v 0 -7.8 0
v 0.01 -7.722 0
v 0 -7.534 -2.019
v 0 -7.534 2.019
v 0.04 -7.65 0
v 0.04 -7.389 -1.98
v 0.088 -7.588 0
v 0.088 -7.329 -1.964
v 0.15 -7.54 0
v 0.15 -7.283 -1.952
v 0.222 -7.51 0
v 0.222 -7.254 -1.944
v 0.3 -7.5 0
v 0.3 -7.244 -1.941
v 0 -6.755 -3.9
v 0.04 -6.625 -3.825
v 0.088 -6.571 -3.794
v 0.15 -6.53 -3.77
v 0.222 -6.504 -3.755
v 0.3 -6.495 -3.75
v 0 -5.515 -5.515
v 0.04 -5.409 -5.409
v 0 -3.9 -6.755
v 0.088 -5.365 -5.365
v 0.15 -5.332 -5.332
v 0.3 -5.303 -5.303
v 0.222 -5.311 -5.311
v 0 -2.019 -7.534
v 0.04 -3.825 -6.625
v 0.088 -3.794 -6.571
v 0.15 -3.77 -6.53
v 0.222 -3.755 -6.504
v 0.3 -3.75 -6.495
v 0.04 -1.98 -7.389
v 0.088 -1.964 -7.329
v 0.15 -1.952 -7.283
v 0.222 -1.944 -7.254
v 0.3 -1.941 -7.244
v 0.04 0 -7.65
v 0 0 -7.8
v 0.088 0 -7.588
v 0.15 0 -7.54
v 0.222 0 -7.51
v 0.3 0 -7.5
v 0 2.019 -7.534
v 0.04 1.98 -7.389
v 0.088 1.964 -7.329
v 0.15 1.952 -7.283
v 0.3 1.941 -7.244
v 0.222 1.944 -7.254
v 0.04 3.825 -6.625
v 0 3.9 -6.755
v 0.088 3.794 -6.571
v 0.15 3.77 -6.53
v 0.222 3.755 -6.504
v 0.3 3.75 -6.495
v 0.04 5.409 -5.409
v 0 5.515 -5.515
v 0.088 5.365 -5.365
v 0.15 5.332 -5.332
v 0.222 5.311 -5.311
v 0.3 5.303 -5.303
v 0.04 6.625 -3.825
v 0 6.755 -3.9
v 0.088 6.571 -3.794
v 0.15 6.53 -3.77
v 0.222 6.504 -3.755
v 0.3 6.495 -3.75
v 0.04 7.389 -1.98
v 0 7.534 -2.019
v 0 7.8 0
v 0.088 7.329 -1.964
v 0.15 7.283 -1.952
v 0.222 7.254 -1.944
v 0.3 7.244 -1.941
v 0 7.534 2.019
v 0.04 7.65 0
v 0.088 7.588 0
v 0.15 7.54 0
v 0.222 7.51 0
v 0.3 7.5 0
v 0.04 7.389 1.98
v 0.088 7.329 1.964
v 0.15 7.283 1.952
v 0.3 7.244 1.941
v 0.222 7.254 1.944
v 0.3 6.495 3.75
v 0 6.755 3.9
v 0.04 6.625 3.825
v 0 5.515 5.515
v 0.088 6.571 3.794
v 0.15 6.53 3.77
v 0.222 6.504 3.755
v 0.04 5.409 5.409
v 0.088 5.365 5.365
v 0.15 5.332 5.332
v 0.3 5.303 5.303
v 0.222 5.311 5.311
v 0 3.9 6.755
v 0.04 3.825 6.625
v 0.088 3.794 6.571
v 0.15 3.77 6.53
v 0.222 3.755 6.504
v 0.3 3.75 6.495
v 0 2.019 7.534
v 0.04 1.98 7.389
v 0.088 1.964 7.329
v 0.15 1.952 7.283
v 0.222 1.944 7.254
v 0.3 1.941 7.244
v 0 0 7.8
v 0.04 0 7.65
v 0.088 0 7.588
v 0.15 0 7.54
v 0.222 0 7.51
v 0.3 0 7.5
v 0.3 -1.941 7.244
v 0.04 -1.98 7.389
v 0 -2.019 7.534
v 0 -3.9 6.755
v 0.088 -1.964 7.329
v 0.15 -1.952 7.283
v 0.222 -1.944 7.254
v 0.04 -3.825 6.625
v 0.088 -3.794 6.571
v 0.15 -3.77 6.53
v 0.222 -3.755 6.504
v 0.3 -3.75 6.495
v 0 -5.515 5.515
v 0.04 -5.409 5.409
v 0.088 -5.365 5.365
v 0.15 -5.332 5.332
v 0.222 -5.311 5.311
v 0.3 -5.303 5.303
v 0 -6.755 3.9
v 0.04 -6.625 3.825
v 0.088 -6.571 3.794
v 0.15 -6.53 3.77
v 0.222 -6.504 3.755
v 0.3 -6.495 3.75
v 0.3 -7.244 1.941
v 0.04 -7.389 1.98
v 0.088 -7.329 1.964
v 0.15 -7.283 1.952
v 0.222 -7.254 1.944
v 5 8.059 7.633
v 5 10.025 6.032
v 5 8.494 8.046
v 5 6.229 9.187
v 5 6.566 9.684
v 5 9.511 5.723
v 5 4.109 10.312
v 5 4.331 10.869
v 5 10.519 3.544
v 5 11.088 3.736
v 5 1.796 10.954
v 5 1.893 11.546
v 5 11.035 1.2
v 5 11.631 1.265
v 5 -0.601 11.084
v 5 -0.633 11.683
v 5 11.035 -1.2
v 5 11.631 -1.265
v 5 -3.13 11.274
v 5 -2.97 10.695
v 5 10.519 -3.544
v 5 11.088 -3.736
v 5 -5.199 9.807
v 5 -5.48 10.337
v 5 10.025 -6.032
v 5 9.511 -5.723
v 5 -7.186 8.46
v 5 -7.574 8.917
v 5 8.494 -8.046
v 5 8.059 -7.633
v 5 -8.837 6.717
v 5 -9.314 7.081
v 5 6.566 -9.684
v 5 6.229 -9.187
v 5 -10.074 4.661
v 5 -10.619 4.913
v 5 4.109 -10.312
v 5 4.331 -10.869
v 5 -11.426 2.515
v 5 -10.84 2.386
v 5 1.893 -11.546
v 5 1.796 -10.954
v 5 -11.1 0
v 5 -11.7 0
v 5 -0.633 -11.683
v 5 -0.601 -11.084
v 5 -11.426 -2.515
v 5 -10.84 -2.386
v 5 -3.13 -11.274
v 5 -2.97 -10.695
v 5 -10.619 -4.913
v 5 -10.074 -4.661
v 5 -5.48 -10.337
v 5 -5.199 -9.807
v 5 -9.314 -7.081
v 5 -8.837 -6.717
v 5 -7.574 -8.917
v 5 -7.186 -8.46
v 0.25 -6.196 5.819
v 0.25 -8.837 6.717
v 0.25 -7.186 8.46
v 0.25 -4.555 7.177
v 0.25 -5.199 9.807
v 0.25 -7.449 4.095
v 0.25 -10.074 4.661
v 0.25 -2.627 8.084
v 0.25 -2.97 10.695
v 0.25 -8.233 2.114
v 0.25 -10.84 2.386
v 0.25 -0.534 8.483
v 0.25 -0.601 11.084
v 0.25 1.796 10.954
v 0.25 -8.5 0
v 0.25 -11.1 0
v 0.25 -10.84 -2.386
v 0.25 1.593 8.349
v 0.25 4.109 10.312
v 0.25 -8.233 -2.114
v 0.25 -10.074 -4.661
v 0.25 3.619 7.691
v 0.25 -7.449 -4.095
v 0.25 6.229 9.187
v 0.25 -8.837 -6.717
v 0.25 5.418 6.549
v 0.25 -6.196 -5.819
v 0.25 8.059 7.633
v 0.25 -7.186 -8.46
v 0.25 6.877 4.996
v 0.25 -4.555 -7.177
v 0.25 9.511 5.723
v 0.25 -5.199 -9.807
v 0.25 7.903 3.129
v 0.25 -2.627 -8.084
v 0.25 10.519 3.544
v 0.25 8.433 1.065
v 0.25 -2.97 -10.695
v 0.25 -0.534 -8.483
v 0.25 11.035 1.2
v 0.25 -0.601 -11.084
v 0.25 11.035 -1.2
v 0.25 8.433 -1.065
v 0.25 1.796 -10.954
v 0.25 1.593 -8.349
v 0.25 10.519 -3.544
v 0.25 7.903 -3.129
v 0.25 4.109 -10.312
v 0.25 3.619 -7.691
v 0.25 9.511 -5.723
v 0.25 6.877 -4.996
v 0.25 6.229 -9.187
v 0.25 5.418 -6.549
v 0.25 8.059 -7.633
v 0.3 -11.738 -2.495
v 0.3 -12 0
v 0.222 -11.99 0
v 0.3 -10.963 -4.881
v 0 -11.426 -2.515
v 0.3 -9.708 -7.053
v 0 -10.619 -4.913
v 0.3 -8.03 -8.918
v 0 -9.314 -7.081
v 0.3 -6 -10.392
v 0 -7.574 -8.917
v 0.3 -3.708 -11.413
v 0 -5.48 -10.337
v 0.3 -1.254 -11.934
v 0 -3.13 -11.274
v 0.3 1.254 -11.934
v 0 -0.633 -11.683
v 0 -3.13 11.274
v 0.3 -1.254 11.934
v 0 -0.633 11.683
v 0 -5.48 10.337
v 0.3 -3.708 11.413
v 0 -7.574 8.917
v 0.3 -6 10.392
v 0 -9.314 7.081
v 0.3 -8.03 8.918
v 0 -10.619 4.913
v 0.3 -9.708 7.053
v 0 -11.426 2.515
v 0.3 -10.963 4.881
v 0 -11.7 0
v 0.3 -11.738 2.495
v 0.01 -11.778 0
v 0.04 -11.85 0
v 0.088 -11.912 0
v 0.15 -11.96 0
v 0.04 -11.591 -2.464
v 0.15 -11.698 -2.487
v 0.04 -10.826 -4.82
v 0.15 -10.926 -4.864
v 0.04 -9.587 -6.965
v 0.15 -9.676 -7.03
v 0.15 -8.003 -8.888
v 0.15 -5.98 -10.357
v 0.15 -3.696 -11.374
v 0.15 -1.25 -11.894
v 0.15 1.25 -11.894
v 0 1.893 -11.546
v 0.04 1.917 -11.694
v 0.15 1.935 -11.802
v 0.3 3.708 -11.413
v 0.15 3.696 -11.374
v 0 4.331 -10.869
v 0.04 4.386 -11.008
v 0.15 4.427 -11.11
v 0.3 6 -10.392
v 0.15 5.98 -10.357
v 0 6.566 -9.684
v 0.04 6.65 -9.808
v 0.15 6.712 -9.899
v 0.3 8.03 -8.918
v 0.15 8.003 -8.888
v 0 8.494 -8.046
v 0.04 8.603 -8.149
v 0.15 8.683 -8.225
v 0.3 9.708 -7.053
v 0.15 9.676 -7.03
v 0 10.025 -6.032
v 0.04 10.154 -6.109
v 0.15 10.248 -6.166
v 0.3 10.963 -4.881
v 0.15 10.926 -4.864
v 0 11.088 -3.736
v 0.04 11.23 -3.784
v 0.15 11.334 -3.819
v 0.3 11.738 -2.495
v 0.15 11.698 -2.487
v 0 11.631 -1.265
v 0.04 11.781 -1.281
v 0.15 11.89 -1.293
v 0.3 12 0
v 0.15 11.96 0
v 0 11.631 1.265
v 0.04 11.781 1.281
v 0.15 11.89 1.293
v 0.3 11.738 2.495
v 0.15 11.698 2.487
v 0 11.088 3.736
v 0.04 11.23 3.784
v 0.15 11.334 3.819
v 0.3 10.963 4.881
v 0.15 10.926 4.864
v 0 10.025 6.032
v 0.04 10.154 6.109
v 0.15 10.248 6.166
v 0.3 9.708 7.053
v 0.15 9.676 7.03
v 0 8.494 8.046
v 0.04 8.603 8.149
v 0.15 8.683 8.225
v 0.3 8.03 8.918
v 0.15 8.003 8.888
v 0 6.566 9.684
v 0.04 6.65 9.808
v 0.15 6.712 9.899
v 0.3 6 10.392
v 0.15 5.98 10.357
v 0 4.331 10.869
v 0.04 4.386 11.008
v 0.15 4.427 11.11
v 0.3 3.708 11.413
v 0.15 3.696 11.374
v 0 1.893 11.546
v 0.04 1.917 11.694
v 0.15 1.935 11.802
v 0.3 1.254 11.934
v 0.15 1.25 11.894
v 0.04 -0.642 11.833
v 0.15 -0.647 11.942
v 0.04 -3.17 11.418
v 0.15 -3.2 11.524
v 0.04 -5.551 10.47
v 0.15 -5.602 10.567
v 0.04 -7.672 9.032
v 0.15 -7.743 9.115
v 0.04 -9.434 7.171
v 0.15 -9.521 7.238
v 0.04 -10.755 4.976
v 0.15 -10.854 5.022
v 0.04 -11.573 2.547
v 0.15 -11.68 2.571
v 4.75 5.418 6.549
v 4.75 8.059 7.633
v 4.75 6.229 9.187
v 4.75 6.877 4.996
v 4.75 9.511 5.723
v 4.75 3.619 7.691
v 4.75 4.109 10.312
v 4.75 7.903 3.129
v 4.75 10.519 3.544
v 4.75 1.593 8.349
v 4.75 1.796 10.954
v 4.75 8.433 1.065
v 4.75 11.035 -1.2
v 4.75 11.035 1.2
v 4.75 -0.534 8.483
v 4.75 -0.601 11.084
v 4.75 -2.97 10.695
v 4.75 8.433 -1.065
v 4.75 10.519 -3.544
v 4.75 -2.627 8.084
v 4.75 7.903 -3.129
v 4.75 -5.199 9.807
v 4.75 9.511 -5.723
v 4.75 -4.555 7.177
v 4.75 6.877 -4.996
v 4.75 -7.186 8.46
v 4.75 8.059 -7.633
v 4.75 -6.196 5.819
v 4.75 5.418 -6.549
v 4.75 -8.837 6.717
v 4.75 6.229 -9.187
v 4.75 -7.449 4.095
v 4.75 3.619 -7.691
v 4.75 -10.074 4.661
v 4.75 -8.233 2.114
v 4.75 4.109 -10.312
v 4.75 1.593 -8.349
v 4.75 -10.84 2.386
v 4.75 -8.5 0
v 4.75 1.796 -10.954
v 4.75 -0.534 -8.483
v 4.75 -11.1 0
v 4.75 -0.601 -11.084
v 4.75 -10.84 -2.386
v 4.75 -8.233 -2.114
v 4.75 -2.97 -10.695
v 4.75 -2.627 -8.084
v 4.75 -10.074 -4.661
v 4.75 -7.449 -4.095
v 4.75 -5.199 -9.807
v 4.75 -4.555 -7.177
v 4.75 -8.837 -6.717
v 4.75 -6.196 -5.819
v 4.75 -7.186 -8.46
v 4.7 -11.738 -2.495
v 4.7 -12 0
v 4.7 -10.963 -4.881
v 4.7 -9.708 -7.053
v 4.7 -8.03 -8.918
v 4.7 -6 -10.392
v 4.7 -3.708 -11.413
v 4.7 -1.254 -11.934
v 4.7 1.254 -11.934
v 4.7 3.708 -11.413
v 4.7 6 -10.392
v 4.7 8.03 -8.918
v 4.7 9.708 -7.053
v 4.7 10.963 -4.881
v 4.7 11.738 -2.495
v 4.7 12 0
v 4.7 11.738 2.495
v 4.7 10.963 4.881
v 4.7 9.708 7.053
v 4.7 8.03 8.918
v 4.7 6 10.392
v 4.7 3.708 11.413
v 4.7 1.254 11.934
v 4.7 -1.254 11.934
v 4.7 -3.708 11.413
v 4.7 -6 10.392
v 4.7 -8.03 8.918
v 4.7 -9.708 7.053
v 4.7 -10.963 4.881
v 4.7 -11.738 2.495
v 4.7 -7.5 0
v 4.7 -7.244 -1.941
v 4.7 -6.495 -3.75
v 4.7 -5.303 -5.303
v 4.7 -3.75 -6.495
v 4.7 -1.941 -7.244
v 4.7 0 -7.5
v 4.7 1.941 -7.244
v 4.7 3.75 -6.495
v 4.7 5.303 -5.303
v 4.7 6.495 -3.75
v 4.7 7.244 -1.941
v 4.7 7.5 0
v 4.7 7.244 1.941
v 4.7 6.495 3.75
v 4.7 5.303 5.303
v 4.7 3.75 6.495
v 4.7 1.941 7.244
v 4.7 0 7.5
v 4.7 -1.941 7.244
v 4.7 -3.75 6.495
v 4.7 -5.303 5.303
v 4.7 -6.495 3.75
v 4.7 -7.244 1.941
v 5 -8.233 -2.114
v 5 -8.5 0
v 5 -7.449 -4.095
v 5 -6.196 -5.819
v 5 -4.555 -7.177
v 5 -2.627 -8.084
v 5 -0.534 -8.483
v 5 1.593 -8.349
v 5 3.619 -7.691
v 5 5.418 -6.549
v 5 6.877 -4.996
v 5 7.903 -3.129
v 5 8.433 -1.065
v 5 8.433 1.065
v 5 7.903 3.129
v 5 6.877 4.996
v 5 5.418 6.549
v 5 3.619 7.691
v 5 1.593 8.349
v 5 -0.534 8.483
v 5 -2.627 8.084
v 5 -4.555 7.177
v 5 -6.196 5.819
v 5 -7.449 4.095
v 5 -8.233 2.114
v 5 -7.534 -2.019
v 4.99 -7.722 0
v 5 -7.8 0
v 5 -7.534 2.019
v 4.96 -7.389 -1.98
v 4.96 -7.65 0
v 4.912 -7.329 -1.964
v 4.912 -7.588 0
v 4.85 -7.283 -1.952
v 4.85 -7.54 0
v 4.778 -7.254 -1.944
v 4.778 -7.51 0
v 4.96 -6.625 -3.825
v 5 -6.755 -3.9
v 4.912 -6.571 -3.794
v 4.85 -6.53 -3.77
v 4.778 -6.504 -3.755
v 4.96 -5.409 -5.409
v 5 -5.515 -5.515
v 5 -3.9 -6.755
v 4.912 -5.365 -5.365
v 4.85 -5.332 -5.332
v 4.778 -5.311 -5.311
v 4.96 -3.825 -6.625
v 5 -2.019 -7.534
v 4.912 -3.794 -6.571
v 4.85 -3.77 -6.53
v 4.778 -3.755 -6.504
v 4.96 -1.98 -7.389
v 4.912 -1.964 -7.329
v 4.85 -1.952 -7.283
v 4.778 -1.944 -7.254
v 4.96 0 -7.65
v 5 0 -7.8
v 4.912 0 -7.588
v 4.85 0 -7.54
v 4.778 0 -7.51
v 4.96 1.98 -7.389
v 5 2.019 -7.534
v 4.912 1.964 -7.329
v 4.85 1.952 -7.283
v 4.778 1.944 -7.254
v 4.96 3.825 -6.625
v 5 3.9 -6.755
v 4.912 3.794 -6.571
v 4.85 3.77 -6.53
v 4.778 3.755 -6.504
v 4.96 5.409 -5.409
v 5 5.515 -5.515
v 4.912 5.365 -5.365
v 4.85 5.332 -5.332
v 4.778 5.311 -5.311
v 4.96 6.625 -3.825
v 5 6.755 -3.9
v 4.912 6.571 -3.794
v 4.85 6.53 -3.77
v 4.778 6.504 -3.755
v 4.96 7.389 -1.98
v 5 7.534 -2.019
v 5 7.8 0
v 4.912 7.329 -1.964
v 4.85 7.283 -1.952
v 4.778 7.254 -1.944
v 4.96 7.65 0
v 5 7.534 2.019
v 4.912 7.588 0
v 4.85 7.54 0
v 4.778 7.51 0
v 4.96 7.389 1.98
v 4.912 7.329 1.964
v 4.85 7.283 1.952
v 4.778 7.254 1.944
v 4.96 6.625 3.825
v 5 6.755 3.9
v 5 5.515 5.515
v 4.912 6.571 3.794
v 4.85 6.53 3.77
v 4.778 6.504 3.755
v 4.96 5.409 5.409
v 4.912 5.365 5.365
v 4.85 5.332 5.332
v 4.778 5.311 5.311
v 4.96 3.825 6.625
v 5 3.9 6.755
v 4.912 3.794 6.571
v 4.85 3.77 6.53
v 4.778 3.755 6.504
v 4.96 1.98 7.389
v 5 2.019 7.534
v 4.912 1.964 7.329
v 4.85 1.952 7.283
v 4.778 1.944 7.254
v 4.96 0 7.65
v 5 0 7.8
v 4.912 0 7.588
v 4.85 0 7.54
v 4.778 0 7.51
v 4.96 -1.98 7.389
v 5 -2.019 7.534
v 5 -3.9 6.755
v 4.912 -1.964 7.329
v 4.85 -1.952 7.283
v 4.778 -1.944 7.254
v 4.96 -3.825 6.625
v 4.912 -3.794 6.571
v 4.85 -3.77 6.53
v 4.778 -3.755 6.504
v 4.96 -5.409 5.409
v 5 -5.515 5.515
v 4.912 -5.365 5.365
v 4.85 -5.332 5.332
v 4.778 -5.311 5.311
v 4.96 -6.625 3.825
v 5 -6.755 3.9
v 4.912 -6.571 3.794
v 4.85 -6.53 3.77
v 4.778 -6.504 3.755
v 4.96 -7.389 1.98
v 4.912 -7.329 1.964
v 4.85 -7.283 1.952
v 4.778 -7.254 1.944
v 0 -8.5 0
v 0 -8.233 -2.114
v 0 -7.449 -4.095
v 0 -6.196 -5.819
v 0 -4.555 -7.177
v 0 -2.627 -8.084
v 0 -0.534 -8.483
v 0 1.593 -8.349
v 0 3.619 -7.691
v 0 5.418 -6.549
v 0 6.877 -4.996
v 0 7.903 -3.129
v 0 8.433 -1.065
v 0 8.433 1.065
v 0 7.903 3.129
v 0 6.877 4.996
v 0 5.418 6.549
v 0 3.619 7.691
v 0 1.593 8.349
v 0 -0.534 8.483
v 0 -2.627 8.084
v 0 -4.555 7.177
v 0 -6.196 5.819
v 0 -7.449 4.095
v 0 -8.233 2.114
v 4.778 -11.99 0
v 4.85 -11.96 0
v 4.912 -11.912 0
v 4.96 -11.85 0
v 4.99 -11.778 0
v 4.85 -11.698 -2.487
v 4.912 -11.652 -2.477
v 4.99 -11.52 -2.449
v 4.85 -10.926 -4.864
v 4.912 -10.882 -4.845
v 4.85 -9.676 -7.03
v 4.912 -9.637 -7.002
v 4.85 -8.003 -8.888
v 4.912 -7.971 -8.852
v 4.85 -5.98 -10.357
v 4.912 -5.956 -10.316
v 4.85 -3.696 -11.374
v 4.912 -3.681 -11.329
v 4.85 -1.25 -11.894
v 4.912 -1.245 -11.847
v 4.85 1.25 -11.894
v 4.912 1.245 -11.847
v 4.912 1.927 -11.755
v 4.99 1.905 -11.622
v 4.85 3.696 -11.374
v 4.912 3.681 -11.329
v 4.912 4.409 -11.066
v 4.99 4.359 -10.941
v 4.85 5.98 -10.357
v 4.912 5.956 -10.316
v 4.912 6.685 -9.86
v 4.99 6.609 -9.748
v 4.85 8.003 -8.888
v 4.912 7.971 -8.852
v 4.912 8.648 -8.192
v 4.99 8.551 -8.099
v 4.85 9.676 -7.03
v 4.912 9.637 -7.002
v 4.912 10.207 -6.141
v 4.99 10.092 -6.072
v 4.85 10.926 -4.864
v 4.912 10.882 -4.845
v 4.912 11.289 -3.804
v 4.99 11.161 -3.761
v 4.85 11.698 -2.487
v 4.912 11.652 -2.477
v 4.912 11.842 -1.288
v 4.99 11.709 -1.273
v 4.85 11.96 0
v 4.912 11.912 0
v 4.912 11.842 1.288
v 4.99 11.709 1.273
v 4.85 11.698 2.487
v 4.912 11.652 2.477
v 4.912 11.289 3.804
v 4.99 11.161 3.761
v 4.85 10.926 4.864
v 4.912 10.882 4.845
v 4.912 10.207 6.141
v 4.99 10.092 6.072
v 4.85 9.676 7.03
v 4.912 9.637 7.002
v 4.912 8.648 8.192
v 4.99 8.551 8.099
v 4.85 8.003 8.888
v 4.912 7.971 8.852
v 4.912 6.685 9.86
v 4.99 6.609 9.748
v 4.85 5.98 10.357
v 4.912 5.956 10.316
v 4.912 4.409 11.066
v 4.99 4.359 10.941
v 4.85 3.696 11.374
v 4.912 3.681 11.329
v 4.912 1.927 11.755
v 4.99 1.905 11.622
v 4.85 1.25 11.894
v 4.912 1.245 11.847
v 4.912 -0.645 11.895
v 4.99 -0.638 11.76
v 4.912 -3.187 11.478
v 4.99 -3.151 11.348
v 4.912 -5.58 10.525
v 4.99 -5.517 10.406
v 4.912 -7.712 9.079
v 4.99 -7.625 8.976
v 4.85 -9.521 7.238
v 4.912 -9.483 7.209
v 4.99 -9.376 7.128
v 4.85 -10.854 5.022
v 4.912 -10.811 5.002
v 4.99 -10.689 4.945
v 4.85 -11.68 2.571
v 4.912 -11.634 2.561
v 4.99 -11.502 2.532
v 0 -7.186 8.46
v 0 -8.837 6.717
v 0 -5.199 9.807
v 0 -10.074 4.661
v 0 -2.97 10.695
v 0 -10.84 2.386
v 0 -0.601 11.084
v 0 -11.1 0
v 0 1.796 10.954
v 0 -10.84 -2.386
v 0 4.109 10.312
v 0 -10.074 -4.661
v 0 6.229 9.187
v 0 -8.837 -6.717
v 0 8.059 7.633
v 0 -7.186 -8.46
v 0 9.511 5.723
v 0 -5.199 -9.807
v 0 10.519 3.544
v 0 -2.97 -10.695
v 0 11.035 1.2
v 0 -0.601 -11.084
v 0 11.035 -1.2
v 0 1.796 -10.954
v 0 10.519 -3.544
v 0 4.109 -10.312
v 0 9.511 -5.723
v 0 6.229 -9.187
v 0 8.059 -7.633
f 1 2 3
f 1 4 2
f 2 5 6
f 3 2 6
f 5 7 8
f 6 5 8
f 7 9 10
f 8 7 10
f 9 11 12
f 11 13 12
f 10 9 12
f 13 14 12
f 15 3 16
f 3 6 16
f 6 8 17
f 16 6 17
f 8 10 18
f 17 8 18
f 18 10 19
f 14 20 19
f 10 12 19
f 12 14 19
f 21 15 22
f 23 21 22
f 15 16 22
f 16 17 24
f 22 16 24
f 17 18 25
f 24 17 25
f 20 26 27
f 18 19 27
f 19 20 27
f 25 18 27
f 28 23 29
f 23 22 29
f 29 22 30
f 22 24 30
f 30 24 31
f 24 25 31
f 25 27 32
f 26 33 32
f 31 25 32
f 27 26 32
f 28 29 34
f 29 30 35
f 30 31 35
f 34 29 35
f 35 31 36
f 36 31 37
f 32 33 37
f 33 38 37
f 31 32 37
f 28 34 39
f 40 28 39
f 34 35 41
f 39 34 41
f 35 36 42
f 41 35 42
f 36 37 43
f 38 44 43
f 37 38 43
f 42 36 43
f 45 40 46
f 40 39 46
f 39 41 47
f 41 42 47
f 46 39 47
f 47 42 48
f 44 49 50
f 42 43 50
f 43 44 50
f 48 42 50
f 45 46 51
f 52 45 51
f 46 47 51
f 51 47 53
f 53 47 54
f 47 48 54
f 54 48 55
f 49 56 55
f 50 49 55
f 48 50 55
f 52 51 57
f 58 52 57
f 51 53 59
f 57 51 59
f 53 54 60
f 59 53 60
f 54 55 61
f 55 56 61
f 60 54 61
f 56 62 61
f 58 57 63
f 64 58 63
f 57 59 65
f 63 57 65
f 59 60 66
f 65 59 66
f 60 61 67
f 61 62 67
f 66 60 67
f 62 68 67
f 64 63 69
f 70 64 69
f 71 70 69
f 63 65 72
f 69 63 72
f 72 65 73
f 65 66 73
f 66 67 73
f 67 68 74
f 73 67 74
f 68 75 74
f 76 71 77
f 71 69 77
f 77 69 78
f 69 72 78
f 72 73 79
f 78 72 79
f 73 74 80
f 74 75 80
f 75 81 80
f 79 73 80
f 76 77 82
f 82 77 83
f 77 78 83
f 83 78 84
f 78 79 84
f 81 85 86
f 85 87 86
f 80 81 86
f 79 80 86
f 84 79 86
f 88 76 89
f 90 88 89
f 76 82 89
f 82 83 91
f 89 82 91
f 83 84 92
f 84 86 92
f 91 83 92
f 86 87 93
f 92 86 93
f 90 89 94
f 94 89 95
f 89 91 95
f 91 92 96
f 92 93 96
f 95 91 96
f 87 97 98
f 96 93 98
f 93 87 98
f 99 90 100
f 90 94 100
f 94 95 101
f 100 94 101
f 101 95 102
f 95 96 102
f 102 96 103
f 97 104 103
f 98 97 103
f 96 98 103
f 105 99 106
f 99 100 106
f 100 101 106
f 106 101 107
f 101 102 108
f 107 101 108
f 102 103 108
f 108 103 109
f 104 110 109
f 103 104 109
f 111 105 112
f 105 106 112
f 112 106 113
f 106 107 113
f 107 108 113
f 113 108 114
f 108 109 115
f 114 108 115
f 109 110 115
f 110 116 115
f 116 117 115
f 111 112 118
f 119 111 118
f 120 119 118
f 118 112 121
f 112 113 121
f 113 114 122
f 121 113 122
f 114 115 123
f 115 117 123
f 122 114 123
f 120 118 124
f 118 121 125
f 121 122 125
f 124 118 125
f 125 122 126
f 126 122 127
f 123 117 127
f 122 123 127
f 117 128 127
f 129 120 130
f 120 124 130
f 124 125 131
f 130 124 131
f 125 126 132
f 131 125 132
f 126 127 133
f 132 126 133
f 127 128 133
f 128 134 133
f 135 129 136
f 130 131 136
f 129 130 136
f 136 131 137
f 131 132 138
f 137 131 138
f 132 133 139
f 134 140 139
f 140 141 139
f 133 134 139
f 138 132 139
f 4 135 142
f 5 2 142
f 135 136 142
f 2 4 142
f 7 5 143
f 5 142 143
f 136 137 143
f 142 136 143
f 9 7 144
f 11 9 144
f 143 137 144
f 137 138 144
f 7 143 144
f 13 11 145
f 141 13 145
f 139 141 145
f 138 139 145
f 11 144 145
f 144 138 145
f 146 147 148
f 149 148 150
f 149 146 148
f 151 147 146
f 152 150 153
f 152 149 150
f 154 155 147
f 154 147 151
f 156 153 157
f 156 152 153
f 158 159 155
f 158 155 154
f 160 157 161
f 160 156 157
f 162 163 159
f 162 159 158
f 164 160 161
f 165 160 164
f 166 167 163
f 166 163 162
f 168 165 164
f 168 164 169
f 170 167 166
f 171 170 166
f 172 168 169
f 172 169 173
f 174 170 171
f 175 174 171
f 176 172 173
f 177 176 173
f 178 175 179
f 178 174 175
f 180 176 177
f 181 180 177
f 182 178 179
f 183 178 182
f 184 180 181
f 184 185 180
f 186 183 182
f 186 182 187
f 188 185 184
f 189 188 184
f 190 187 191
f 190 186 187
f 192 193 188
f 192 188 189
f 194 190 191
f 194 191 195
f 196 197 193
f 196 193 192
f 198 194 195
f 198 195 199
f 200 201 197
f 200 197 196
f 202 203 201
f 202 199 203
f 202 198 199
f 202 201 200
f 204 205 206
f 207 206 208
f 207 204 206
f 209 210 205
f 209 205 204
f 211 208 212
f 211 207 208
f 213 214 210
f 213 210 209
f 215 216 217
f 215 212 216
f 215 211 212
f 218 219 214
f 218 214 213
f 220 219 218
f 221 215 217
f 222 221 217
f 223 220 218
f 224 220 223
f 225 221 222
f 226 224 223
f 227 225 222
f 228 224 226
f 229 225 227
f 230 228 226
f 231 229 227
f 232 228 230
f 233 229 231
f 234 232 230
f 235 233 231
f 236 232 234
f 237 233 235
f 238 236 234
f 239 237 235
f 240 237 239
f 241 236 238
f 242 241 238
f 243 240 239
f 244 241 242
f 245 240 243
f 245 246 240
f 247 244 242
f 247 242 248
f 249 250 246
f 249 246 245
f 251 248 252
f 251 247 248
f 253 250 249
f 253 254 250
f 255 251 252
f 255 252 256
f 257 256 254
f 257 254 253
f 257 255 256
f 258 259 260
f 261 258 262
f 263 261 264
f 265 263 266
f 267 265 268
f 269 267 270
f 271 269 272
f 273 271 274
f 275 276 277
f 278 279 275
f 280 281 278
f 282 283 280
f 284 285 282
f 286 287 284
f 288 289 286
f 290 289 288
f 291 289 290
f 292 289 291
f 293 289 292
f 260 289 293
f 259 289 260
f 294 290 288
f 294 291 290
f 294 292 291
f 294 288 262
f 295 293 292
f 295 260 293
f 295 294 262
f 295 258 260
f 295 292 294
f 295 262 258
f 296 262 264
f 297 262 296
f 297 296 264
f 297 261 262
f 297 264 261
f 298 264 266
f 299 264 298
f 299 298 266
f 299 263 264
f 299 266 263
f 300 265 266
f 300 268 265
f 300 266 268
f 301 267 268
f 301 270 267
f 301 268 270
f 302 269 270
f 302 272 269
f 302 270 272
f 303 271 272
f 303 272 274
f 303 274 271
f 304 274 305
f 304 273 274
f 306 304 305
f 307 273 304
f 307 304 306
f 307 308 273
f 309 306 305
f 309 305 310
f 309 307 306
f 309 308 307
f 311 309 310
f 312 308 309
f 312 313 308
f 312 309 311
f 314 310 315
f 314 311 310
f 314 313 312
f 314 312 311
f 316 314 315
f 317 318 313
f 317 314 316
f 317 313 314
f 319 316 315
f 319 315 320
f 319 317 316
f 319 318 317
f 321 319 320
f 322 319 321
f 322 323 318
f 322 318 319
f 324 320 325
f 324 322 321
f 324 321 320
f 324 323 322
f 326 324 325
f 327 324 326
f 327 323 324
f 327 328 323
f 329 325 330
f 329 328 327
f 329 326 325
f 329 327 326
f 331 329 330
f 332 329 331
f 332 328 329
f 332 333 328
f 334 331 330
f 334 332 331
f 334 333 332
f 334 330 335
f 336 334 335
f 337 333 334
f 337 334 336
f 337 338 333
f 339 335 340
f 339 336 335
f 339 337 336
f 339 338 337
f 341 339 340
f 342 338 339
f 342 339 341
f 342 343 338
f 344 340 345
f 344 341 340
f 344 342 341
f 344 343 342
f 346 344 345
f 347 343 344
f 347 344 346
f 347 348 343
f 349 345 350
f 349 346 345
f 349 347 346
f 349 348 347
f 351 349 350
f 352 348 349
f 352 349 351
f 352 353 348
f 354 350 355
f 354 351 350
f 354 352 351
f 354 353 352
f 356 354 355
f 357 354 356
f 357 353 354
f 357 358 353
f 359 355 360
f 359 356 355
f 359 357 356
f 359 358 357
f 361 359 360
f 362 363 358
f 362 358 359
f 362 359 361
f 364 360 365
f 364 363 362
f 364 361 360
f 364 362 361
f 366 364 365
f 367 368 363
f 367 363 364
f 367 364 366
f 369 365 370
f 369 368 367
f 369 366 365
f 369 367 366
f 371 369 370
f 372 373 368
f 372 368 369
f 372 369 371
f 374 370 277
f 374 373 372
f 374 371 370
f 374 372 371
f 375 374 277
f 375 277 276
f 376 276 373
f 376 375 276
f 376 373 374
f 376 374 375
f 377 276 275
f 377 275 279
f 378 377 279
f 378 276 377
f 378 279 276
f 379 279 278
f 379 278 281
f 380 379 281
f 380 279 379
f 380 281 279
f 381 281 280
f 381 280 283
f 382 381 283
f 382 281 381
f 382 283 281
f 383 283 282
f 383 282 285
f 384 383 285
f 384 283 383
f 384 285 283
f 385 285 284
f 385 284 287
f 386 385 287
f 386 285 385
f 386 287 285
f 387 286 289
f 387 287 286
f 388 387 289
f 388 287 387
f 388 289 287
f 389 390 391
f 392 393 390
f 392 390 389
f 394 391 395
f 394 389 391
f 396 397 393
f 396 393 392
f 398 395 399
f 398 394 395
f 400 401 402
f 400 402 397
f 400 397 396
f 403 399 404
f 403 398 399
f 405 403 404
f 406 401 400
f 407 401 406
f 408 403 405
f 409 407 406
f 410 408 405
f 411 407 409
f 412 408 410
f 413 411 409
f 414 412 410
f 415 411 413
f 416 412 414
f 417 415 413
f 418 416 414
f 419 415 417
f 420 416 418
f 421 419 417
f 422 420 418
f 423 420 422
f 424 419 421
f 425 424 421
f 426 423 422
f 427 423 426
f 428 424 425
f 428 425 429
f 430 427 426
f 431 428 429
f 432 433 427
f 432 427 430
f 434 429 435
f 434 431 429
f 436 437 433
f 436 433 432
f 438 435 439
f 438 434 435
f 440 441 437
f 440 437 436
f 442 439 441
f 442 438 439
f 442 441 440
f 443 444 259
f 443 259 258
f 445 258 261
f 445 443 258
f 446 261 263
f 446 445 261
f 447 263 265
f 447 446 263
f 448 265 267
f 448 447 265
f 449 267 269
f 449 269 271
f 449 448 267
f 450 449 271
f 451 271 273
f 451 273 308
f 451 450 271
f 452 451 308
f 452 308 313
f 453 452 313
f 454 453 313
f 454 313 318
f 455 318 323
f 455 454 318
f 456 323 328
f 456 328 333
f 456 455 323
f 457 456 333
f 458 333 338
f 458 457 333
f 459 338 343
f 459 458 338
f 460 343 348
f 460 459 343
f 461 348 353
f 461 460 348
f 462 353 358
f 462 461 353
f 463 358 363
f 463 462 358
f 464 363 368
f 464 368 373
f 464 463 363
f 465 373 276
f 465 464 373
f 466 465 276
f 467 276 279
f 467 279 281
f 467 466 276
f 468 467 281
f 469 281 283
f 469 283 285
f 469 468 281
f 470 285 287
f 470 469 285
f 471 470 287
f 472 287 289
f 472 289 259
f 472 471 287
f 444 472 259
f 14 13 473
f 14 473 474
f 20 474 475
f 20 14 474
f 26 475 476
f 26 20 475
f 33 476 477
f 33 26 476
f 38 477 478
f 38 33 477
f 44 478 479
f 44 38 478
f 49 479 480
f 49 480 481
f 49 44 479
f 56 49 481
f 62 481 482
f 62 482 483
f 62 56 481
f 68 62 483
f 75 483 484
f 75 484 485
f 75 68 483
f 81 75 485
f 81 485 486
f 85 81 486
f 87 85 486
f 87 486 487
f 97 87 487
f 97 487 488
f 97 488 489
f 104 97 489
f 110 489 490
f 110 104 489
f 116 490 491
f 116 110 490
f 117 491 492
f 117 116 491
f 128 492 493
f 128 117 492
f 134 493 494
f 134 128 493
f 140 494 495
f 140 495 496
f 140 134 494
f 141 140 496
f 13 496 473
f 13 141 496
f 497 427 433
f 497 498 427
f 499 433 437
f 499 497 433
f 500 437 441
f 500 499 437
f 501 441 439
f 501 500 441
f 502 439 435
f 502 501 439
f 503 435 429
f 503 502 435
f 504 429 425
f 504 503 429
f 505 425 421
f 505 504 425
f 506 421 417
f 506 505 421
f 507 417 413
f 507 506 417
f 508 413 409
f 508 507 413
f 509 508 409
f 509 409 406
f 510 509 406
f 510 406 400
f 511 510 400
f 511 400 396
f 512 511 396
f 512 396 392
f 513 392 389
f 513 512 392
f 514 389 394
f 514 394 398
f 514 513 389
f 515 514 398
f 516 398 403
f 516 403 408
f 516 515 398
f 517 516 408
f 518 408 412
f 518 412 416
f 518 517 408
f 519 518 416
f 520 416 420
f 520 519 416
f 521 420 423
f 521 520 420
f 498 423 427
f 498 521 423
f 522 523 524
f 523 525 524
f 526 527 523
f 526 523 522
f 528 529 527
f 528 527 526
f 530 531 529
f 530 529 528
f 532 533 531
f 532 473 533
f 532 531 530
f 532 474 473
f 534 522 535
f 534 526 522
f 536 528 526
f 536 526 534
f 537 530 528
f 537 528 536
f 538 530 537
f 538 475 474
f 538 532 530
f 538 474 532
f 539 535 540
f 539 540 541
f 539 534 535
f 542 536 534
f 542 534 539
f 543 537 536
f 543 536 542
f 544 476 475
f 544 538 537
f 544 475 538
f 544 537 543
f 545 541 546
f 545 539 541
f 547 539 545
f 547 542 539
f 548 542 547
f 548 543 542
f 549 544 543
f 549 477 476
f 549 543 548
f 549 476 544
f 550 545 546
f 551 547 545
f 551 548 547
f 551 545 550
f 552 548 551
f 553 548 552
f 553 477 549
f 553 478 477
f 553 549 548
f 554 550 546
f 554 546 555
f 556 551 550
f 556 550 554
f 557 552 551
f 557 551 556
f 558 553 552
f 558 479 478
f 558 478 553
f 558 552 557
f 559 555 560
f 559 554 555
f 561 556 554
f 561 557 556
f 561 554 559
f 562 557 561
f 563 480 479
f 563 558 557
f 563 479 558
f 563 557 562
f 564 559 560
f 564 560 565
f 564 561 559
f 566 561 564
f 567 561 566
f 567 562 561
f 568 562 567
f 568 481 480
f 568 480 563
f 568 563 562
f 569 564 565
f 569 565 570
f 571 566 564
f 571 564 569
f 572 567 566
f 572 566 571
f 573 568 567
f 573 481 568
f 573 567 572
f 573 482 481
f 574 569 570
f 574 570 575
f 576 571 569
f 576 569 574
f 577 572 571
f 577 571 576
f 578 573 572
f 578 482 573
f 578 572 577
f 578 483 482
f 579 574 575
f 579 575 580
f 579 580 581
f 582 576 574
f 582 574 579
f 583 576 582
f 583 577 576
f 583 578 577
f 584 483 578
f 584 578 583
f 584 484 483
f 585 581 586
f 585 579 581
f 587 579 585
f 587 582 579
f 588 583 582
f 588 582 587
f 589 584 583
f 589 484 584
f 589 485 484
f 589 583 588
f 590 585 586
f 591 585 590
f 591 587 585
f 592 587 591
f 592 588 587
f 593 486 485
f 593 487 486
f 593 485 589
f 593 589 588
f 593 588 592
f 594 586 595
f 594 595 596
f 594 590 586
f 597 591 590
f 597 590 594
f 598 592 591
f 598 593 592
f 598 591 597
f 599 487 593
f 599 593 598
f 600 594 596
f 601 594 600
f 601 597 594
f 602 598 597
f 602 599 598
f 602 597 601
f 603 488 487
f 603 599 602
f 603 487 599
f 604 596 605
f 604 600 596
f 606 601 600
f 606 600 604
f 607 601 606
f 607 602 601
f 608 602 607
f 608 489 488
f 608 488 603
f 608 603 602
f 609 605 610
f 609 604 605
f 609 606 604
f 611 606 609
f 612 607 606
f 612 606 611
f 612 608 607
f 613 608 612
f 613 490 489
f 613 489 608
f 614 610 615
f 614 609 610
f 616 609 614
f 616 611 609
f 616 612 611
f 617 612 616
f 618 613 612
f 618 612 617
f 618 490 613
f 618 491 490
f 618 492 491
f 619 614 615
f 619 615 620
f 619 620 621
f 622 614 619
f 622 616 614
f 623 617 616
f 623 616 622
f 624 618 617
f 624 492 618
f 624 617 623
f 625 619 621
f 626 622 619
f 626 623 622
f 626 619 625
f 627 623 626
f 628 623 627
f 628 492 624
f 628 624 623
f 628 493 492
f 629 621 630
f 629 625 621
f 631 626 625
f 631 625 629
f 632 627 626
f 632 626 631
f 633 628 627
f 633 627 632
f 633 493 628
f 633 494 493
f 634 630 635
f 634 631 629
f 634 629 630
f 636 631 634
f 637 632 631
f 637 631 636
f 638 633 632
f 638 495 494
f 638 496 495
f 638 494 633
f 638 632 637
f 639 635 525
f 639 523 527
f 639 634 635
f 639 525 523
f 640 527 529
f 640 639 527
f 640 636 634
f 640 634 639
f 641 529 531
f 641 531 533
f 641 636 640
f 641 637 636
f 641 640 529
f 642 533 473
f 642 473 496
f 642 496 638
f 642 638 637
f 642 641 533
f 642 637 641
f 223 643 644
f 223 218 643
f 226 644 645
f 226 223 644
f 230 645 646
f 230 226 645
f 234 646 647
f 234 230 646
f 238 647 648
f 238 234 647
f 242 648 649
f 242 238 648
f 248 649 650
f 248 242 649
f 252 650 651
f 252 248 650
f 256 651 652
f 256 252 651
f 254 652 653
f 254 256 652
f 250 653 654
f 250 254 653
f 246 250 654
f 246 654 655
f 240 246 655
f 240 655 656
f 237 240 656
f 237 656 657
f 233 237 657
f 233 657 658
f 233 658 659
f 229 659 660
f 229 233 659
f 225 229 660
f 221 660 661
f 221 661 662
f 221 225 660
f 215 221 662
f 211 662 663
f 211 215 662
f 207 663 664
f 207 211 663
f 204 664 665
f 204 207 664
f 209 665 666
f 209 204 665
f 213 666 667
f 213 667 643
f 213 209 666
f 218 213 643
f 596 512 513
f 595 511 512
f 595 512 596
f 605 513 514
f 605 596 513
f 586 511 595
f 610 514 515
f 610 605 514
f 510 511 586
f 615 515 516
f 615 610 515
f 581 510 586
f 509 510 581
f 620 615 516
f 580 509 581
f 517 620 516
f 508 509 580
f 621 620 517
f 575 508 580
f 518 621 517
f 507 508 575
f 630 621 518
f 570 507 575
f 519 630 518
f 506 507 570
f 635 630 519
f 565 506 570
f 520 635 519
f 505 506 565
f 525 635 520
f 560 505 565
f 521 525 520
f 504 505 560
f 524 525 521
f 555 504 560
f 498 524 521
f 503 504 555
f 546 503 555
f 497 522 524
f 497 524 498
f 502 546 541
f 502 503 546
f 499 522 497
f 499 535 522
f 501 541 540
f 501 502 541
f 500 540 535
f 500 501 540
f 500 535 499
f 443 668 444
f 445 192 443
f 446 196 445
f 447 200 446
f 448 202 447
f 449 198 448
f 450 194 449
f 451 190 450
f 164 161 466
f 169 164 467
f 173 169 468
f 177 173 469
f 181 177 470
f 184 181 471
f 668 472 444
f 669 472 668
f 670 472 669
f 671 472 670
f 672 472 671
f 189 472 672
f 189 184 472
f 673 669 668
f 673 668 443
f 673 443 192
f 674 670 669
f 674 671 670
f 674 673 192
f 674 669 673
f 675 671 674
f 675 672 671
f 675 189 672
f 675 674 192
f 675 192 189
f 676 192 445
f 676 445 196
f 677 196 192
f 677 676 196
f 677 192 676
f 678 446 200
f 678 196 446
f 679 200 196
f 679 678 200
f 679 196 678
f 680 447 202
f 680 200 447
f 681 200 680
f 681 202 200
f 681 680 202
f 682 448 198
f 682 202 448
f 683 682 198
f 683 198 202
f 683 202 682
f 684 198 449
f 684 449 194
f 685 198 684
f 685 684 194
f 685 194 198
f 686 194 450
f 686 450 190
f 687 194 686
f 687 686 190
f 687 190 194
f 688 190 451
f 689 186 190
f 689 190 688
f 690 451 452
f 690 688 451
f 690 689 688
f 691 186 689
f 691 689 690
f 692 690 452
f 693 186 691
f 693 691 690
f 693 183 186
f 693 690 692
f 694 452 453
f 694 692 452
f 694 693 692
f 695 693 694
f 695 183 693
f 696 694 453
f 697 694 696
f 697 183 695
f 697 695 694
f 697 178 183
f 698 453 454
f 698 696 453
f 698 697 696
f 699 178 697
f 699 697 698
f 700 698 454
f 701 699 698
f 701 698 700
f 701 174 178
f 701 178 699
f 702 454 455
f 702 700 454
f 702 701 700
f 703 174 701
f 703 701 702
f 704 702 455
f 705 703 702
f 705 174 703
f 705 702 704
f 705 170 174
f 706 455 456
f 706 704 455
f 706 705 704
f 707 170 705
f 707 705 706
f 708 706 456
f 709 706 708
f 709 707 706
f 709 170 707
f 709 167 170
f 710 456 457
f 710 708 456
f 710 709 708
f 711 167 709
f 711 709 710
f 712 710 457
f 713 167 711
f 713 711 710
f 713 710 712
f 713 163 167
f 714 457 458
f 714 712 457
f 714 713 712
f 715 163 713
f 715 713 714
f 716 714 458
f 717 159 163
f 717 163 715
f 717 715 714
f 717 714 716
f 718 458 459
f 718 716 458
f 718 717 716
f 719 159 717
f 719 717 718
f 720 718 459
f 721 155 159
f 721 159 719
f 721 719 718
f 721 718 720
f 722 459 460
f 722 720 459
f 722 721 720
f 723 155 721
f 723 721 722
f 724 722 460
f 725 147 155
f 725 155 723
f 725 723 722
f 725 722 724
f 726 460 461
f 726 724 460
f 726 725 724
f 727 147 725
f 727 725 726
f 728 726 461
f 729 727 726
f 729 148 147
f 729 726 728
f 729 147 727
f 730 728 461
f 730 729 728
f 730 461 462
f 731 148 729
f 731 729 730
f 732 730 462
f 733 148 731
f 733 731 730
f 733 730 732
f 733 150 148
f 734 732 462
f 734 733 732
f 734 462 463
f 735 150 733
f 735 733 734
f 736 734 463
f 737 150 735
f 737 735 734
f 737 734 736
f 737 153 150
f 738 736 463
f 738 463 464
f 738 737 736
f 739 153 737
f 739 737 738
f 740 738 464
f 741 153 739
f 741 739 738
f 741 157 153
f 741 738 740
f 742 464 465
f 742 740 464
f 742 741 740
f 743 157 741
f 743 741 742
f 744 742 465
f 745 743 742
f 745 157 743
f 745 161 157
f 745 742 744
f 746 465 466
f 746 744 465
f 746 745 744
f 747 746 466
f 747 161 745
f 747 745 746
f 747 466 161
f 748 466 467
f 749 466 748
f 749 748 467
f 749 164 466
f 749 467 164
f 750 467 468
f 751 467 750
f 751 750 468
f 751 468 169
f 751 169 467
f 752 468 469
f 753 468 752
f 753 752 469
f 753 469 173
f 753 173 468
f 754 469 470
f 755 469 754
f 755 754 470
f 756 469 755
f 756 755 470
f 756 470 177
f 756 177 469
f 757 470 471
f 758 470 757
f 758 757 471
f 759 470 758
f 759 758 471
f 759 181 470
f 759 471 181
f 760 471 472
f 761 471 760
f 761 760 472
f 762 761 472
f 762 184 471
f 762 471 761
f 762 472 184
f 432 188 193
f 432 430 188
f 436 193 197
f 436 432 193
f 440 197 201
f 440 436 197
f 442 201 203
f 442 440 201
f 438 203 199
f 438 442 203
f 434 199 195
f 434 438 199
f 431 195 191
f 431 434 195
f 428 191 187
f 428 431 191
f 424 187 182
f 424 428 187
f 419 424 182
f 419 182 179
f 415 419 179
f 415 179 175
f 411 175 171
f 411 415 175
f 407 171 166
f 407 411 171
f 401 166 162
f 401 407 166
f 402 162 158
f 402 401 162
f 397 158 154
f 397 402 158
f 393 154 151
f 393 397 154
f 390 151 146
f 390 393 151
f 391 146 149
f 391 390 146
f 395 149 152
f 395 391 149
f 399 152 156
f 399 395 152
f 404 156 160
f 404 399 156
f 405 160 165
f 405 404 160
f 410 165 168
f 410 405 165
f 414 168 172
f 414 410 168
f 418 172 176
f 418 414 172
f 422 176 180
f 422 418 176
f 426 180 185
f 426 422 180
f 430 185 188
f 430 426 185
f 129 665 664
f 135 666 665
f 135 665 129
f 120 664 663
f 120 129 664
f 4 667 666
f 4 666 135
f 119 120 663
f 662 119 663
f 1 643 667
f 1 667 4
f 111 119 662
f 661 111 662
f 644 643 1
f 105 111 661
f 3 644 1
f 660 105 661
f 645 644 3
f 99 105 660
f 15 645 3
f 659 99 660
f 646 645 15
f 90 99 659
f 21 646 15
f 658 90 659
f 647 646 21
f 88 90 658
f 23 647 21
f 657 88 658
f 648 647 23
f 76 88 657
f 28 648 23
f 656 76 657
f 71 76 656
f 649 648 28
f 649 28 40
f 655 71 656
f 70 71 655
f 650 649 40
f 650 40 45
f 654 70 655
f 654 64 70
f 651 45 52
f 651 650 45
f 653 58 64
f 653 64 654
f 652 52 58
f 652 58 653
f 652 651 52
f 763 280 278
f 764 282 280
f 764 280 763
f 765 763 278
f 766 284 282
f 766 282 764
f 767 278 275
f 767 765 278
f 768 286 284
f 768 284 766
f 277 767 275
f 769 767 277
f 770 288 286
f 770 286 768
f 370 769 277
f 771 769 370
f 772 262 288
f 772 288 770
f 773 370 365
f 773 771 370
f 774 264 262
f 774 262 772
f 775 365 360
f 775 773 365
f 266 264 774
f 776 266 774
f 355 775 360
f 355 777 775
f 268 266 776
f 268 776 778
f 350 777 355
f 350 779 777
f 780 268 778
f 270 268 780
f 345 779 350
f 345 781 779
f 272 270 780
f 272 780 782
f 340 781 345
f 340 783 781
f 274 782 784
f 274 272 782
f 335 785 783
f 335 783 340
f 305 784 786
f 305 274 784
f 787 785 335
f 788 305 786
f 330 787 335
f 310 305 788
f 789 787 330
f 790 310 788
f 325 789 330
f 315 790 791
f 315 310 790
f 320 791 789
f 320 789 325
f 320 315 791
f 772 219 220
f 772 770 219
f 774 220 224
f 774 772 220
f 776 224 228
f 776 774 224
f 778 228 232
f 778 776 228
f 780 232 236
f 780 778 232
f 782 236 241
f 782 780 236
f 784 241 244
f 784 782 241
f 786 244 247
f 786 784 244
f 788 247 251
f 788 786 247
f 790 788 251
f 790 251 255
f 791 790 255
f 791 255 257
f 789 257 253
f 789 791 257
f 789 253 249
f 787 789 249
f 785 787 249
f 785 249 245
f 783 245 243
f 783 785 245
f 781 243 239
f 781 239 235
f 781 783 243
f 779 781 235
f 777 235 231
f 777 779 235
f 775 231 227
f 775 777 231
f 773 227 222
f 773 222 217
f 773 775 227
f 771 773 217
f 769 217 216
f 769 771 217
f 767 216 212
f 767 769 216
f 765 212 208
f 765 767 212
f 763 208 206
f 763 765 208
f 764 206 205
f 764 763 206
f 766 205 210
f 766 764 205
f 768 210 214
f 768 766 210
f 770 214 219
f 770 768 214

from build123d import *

# Parameters (mm, degrees)
FILLET1_R = 0.3


with BuildPart() as part:
    # Sketch1 → Revolve1 (revolve)
    with BuildSketch(Plane.XY, mode=Mode.PRIVATE) as revolve1_sk:
        Polygon((0, 7.5), (0, 8.5), (0.25, 8.5), (0.25, 11.1), (0, 11.1), (0, 12), (5, 12), (5, 11.1), (4.75, 11.1), (4.75, 8.5), (5, 8.5), (5, 7.5), align=None)
    revolve(revolve1_sk.sketch.rotate(Axis((0, 0, 0), (1, 0, 0)), 180), axis=Axis((0, 0, 0), (1, 0, 0)))

    # Fillet1
    fillet1_edges = [part.edges().sort_by_distance(p)[0] for p in [
        (5, 12, 0),
        (0, 12, 0),
        (0, 7.5, 0),
        (5, 7.5, 0),
    ]]
    fillet(fillet1_edges, radius=FILLET1_R)


solid = part.part
